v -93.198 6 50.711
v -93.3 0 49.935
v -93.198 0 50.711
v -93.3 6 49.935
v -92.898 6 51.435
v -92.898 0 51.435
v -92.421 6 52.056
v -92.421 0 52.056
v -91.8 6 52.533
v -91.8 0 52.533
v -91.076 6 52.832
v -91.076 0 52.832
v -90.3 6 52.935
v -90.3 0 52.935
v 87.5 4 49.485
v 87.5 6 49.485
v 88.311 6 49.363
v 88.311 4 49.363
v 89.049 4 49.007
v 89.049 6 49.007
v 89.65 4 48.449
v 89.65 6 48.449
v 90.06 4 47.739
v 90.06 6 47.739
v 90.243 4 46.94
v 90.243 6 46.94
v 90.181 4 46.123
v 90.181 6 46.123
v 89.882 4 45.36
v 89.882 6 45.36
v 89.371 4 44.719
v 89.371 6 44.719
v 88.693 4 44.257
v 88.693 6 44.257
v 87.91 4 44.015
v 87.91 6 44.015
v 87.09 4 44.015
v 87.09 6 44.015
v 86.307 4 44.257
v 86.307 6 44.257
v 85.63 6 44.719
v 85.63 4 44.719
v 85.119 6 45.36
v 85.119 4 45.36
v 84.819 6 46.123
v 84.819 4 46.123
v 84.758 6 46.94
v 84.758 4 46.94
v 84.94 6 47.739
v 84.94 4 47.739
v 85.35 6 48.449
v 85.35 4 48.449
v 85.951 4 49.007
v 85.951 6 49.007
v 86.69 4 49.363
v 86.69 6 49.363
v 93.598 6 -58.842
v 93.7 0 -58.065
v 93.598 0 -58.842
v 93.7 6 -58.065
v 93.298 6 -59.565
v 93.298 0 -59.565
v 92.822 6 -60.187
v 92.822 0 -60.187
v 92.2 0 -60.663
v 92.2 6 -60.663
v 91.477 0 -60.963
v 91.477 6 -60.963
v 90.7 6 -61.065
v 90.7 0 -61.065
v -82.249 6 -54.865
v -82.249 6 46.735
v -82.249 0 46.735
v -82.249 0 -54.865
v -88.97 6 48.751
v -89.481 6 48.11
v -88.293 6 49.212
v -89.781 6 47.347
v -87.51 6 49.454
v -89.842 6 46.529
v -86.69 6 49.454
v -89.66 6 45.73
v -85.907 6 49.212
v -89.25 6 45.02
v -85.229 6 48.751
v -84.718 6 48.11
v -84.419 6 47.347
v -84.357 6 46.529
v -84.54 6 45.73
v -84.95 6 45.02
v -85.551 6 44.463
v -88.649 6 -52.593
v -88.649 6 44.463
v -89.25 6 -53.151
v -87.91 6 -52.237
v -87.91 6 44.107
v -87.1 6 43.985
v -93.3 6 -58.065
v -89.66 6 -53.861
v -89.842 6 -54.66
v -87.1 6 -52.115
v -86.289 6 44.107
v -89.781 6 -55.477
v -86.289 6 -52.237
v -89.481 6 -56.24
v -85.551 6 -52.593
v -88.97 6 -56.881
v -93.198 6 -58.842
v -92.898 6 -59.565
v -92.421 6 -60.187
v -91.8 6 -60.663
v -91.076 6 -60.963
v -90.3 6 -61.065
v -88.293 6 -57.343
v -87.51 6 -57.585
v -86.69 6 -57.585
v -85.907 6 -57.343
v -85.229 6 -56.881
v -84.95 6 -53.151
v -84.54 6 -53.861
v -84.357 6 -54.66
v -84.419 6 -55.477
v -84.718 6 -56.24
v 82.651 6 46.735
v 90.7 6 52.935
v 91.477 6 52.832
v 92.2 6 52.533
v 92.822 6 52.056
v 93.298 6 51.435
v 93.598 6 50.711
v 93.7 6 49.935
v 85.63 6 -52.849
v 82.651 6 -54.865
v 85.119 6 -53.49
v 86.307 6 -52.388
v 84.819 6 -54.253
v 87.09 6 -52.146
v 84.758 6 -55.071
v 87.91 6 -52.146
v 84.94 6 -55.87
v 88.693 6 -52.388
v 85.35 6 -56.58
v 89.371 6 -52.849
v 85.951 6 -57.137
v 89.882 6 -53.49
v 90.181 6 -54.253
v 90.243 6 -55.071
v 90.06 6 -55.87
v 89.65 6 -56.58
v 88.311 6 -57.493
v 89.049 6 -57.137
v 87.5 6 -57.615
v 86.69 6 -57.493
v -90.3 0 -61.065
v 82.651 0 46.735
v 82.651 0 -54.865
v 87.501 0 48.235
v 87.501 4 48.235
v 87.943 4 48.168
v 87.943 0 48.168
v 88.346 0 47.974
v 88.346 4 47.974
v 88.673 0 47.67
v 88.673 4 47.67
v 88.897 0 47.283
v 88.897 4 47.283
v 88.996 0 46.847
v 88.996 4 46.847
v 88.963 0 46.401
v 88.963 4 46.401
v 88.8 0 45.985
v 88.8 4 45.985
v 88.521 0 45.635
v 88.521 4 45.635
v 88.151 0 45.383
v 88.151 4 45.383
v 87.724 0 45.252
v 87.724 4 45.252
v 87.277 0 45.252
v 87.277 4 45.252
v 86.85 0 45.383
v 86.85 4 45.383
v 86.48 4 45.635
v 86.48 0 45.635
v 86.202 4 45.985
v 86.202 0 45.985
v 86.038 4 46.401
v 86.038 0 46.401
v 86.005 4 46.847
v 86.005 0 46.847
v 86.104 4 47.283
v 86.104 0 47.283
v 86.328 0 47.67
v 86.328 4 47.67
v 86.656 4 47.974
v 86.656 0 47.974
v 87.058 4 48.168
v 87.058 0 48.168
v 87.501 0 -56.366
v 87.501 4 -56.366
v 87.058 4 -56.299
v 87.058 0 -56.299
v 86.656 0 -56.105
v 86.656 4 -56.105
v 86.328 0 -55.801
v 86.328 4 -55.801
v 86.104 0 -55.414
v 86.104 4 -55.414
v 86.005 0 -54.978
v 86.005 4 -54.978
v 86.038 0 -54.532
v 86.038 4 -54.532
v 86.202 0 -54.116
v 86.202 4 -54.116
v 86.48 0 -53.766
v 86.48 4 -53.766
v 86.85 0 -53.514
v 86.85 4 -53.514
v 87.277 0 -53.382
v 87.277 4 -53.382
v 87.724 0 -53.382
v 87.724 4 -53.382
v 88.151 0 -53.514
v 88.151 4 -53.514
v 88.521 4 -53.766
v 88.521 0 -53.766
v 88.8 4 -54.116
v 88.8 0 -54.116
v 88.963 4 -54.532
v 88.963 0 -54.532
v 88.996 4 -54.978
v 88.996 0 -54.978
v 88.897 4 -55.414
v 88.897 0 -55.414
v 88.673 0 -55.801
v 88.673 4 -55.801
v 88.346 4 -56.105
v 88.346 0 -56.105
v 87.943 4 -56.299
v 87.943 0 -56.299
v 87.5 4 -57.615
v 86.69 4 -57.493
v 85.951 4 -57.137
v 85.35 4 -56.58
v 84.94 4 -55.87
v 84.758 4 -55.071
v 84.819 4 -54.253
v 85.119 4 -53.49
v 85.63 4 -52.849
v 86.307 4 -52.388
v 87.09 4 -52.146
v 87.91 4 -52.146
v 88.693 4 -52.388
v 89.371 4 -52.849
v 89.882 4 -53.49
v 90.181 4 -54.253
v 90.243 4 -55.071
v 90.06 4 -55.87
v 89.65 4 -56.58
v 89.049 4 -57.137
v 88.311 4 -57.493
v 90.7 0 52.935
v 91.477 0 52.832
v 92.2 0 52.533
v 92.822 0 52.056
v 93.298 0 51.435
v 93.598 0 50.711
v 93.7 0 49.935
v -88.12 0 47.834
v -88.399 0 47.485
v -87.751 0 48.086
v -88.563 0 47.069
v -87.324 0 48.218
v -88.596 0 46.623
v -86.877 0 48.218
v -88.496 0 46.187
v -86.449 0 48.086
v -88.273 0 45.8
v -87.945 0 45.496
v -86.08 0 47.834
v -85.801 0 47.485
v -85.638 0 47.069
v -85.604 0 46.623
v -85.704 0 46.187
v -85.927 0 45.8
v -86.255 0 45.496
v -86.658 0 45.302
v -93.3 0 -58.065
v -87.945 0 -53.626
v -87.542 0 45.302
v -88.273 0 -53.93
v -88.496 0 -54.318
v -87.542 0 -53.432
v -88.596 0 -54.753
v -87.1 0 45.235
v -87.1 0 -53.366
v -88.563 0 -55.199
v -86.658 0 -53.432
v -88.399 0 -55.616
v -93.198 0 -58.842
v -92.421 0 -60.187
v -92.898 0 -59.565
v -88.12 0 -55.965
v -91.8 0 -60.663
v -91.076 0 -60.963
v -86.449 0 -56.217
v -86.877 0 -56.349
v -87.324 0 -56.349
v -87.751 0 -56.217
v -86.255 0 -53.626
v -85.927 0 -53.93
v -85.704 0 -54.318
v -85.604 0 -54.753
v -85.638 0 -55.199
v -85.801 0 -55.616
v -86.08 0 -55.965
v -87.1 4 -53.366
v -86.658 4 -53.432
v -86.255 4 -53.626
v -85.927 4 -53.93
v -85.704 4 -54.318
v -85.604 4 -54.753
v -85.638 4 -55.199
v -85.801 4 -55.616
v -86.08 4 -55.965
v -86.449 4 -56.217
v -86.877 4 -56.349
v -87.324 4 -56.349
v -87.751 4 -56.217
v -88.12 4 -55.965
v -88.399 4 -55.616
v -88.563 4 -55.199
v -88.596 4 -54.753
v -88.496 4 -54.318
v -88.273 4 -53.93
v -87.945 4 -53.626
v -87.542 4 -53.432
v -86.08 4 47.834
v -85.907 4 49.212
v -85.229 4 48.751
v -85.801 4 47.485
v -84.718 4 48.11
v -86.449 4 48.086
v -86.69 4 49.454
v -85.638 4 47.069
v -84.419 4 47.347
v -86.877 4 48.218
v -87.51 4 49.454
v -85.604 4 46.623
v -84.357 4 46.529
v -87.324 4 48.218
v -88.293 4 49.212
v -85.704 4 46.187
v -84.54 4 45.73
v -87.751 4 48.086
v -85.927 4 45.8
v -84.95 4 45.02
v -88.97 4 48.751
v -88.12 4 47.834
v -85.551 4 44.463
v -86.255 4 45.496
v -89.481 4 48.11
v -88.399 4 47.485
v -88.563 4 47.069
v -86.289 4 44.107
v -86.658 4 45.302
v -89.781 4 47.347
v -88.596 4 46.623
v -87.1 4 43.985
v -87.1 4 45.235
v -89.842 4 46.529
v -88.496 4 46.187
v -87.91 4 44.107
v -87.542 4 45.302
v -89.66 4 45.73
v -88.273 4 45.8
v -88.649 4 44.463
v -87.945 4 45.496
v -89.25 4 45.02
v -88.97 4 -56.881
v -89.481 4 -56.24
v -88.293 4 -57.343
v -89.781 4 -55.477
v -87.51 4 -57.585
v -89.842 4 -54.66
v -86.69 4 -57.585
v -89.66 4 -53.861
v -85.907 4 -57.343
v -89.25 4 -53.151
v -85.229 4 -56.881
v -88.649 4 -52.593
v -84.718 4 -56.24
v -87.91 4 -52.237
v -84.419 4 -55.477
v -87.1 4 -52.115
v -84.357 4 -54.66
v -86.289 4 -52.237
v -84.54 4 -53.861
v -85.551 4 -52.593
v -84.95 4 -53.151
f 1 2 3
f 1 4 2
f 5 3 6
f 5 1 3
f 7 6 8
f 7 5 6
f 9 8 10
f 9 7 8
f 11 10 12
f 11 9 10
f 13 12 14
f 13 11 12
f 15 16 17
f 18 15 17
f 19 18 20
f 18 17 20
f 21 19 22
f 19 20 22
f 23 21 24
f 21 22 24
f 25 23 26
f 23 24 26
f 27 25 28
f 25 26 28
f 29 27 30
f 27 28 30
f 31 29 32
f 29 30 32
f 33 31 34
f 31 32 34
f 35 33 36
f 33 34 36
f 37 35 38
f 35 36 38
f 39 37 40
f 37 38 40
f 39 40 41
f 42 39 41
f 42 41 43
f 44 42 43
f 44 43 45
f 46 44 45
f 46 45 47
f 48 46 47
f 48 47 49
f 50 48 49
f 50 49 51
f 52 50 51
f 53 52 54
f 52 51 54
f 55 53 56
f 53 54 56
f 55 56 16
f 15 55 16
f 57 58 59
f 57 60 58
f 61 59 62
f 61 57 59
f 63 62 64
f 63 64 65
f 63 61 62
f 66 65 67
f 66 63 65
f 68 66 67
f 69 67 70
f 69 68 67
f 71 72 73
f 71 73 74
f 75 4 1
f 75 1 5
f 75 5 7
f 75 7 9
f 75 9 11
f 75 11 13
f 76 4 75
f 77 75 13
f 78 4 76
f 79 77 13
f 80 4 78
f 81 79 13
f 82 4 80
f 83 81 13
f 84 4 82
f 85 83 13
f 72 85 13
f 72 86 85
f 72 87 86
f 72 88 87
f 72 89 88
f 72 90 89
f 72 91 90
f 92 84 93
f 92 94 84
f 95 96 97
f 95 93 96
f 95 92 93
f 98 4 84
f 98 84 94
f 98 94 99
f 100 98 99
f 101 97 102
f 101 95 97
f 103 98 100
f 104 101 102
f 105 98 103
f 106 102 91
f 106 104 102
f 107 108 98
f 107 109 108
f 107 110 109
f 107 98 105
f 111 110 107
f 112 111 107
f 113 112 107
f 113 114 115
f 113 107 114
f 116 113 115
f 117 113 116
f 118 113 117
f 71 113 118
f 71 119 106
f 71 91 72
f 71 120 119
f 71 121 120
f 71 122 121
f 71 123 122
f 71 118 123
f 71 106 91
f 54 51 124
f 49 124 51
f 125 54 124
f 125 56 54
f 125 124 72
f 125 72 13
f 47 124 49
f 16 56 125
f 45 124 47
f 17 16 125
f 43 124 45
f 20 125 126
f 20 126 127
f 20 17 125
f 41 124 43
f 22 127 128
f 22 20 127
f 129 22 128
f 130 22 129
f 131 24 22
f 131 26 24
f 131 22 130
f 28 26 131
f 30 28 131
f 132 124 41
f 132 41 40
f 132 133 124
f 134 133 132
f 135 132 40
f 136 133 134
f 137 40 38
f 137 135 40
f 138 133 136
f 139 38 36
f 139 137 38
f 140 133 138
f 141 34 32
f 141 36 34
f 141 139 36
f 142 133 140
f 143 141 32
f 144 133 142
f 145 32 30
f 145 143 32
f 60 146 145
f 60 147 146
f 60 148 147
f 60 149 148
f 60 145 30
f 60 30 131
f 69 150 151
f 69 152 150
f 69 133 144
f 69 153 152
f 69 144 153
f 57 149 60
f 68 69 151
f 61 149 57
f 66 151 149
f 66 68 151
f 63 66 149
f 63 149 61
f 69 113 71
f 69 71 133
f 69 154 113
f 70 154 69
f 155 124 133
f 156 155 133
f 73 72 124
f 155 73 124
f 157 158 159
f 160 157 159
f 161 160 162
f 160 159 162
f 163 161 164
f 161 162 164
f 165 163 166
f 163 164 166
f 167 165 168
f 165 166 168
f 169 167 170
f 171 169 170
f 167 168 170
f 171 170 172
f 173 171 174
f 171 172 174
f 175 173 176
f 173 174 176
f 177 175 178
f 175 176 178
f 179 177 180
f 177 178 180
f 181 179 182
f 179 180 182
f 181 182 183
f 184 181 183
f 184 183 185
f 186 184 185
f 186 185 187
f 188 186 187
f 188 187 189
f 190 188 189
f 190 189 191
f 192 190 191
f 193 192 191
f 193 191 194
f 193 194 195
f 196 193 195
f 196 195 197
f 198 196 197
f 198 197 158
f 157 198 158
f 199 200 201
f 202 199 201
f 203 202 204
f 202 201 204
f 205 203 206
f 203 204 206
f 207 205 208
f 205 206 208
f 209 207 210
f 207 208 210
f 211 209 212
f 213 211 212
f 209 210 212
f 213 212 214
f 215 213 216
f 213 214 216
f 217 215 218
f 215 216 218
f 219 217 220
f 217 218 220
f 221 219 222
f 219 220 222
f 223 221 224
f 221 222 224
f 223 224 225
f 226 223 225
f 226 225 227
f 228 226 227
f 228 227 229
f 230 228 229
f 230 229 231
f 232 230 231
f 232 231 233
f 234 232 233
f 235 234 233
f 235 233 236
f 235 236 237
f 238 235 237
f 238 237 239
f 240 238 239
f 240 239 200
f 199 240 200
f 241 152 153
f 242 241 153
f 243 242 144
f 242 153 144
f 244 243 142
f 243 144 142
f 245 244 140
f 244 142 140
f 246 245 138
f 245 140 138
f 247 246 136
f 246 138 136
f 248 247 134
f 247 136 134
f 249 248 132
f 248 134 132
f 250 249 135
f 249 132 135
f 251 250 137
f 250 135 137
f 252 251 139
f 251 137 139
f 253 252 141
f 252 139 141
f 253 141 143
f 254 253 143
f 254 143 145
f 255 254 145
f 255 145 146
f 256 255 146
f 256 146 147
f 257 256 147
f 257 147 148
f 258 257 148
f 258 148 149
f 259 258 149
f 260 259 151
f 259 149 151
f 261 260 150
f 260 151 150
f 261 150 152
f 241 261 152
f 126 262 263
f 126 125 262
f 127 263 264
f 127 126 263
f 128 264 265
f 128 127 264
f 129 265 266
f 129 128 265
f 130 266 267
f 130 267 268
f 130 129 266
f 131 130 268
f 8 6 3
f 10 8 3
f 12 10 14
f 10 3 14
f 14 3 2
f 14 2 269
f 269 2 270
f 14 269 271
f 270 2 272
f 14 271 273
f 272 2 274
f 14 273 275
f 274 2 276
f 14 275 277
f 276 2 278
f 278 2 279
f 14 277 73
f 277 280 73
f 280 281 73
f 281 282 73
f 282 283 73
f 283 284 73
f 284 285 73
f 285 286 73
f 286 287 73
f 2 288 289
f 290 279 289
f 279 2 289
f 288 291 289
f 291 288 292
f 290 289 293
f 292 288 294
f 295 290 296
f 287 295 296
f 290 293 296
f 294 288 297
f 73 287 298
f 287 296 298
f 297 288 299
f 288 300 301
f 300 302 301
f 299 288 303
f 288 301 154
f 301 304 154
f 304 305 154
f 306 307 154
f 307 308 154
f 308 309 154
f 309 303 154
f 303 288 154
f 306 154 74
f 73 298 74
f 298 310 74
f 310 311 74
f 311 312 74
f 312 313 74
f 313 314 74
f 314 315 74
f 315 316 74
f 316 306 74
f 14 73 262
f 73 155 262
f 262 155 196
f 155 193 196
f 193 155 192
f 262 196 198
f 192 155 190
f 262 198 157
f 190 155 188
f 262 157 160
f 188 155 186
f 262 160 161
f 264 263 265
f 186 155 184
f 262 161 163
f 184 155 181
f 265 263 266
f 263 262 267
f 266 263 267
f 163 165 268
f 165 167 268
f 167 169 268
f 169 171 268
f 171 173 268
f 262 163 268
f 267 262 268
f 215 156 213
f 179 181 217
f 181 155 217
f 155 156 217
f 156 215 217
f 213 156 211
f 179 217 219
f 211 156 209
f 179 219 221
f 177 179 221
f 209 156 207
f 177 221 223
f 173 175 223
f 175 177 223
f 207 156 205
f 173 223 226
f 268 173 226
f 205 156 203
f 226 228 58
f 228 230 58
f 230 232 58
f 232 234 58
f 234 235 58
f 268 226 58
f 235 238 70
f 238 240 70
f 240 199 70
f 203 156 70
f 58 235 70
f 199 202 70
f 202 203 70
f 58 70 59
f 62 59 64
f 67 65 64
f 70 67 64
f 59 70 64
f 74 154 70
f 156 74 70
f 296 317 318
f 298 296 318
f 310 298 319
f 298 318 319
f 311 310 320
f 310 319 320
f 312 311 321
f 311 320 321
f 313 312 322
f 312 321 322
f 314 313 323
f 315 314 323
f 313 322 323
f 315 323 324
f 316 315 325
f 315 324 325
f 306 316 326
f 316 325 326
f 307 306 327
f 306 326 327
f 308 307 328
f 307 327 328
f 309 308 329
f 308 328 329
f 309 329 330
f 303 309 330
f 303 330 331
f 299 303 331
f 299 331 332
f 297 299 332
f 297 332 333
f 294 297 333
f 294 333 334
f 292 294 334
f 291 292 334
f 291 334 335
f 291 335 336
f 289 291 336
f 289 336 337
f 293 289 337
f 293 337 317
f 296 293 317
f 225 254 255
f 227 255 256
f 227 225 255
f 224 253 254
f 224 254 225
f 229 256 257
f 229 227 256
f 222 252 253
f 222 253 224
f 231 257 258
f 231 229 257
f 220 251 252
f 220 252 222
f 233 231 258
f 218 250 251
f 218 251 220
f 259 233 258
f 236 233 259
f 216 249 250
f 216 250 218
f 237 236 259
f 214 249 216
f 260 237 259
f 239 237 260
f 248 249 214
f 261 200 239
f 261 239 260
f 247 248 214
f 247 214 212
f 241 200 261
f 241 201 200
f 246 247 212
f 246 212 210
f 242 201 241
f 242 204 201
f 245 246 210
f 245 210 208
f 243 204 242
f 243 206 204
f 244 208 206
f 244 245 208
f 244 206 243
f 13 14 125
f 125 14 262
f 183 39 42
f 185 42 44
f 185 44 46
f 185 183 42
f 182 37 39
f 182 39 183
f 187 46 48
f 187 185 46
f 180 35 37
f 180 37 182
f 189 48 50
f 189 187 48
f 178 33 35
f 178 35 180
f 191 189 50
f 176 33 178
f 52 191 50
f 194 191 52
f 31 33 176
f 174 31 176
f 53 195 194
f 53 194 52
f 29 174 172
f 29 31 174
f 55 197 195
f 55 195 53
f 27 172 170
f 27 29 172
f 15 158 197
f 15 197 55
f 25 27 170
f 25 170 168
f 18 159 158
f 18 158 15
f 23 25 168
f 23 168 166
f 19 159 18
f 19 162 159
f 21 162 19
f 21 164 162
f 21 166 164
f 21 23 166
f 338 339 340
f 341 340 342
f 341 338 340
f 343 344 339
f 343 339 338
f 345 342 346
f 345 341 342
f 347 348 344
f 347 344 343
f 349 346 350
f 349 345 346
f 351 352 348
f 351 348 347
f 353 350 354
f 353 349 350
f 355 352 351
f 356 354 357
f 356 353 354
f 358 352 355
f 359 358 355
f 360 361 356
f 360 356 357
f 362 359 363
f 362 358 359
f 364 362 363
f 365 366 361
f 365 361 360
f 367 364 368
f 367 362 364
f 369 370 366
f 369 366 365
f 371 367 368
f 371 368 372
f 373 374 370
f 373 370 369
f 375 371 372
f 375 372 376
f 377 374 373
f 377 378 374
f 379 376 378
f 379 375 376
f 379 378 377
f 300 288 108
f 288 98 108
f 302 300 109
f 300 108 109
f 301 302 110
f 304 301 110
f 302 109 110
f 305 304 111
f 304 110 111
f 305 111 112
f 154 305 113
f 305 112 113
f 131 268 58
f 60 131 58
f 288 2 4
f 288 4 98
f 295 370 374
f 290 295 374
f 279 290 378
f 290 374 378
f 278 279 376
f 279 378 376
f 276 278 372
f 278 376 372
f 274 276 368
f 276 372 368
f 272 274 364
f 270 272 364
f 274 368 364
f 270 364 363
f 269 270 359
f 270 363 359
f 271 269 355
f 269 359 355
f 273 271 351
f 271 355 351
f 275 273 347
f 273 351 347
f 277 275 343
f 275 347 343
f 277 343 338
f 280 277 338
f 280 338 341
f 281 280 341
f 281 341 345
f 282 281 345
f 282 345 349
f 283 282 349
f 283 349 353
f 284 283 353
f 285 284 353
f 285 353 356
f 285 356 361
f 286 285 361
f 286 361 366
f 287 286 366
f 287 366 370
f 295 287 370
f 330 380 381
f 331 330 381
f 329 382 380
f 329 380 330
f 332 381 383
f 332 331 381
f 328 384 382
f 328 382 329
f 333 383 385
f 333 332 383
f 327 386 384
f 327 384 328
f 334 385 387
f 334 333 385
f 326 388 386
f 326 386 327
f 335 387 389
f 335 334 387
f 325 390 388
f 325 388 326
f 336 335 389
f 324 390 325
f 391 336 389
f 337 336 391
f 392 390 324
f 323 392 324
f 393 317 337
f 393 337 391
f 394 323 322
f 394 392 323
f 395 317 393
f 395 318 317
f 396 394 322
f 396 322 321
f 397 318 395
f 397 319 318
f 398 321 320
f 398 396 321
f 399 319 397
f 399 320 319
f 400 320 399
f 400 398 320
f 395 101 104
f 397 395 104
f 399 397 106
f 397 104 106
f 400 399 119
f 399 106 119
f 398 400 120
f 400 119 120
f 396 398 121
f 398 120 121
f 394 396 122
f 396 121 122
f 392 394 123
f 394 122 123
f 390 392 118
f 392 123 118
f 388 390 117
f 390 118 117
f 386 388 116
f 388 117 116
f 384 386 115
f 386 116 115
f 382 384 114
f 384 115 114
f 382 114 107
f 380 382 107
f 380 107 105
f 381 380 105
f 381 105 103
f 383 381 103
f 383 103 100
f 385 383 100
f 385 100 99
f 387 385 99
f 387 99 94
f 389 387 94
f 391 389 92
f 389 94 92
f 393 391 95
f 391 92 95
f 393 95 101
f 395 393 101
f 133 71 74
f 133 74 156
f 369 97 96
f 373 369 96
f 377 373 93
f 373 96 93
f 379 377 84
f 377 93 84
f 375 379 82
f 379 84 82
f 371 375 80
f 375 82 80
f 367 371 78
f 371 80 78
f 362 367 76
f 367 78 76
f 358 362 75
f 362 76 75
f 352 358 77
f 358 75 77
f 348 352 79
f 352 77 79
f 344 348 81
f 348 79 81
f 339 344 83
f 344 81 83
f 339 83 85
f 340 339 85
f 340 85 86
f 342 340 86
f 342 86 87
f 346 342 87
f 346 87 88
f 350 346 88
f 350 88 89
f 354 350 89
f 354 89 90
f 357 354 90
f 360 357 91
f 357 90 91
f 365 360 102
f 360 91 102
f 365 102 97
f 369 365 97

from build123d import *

# Parameters (mm, degrees)
SKETCH_1_W          = 187
SKETCH_1_H          = 114
EXTRUDE_1_DEPTH     = 6
FILLET_1_R          = 3
SKETCH_3_W          = 164.9
SKETCH_3_H          = 101.6
CUT_EXTRUDE_1_DEPTH = 6
SKETCH_6_R          = 1.5
CUT_EXTRUDE_3_DEPTH = 6
SKETCH_7_R          = 2.75
CUT_EXTRUDE_4_DEPTH = 2


with BuildPart() as part:
    # 草图1 → 凸台-拉伸1 (new body)
    with BuildSketch(Plane(origin=(0, 0, 0), x_dir=(1, 0, 0), z_dir=(0, 1, 0))):
        with Locations((0.200214133, 4.065310493)):
            Rectangle(SKETCH_1_W, SKETCH_1_H)
    extrude(amount=EXTRUDE_1_DEPTH)

    # 圆角1
    fillet_1_edges = [part.edges().sort_by_distance(p)[0] for p in [
        (-93.299785867, 3, -61.065310493),
        (93.700214133, 3, -61.065310493),
        (93.700214133, 3, 52.934689507),
        (-93.299785867, 3, 52.934689507),
    ]]
    fillet(fillet_1_edges, radius=FILLET_1_R)

    # 草图3 → 切除-拉伸1 (cut)
    with BuildSketch(Plane(origin=(0, 6, 0), x_dir=(1, 0, 0), z_dir=(0, 1, 0))):
        with Locations((0.200562113, 4.065310493)):
            Rectangle(SKETCH_3_W, SKETCH_3_H)
    extrude(amount=-CUT_EXTRUDE_1_DEPTH, mode=Mode.SUBTRACT)

    # 草图6 → 切除-拉伸3 (cut)
    with BuildSketch(Plane(origin=(0, 6, 0), x_dir=(1, 0, 0), z_dir=(0, 1, 0))):
        with Locations(Location((87.500562113, -46.734892708, 0), (0, 0, 270))):
            Circle(SKETCH_6_R)
        with Locations(Location((87.500562113, 54.865513693, 0), (0, 0, 90))):
            Circle(SKETCH_6_R)
        with Locations(Location((-87.100133848, -46.734892708, 0), (0, 0, 90))):
            Circle(SKETCH_6_R)
        with Locations(Location((-87.100133848, 54.865513693, 0), (0, 0, 270))):
            Circle(SKETCH_6_R)
    extrude(amount=-CUT_EXTRUDE_3_DEPTH, mode=Mode.SUBTRACT)

    # 草图7 → 切除-拉伸4 (cut)
    with BuildSketch(Plane(origin=(0, 6, 0), x_dir=(1, 0, 0), z_dir=(0, 1, 0))):
        with Locations(Location((-87.099785867, 54.865310493, 0), (0, 0, 270))):
            Circle(SKETCH_7_R)
        with Locations(Location((87.500214133, 54.865310493, 0), (0, 0, 90))):
            Circle(SKETCH_7_R)
        with Locations(Location((-87.099785867, -46.734689507, 0), (0, 0, 90))):
            Circle(SKETCH_7_R)
        with Locations(Location((87.500214133, -46.734689507, 0), (0, 0, 270))):
            Circle(SKETCH_7_R)
    extrude(amount=-CUT_EXTRUDE_4_DEPTH, mode=Mode.SUBTRACT)


solid = part.part
